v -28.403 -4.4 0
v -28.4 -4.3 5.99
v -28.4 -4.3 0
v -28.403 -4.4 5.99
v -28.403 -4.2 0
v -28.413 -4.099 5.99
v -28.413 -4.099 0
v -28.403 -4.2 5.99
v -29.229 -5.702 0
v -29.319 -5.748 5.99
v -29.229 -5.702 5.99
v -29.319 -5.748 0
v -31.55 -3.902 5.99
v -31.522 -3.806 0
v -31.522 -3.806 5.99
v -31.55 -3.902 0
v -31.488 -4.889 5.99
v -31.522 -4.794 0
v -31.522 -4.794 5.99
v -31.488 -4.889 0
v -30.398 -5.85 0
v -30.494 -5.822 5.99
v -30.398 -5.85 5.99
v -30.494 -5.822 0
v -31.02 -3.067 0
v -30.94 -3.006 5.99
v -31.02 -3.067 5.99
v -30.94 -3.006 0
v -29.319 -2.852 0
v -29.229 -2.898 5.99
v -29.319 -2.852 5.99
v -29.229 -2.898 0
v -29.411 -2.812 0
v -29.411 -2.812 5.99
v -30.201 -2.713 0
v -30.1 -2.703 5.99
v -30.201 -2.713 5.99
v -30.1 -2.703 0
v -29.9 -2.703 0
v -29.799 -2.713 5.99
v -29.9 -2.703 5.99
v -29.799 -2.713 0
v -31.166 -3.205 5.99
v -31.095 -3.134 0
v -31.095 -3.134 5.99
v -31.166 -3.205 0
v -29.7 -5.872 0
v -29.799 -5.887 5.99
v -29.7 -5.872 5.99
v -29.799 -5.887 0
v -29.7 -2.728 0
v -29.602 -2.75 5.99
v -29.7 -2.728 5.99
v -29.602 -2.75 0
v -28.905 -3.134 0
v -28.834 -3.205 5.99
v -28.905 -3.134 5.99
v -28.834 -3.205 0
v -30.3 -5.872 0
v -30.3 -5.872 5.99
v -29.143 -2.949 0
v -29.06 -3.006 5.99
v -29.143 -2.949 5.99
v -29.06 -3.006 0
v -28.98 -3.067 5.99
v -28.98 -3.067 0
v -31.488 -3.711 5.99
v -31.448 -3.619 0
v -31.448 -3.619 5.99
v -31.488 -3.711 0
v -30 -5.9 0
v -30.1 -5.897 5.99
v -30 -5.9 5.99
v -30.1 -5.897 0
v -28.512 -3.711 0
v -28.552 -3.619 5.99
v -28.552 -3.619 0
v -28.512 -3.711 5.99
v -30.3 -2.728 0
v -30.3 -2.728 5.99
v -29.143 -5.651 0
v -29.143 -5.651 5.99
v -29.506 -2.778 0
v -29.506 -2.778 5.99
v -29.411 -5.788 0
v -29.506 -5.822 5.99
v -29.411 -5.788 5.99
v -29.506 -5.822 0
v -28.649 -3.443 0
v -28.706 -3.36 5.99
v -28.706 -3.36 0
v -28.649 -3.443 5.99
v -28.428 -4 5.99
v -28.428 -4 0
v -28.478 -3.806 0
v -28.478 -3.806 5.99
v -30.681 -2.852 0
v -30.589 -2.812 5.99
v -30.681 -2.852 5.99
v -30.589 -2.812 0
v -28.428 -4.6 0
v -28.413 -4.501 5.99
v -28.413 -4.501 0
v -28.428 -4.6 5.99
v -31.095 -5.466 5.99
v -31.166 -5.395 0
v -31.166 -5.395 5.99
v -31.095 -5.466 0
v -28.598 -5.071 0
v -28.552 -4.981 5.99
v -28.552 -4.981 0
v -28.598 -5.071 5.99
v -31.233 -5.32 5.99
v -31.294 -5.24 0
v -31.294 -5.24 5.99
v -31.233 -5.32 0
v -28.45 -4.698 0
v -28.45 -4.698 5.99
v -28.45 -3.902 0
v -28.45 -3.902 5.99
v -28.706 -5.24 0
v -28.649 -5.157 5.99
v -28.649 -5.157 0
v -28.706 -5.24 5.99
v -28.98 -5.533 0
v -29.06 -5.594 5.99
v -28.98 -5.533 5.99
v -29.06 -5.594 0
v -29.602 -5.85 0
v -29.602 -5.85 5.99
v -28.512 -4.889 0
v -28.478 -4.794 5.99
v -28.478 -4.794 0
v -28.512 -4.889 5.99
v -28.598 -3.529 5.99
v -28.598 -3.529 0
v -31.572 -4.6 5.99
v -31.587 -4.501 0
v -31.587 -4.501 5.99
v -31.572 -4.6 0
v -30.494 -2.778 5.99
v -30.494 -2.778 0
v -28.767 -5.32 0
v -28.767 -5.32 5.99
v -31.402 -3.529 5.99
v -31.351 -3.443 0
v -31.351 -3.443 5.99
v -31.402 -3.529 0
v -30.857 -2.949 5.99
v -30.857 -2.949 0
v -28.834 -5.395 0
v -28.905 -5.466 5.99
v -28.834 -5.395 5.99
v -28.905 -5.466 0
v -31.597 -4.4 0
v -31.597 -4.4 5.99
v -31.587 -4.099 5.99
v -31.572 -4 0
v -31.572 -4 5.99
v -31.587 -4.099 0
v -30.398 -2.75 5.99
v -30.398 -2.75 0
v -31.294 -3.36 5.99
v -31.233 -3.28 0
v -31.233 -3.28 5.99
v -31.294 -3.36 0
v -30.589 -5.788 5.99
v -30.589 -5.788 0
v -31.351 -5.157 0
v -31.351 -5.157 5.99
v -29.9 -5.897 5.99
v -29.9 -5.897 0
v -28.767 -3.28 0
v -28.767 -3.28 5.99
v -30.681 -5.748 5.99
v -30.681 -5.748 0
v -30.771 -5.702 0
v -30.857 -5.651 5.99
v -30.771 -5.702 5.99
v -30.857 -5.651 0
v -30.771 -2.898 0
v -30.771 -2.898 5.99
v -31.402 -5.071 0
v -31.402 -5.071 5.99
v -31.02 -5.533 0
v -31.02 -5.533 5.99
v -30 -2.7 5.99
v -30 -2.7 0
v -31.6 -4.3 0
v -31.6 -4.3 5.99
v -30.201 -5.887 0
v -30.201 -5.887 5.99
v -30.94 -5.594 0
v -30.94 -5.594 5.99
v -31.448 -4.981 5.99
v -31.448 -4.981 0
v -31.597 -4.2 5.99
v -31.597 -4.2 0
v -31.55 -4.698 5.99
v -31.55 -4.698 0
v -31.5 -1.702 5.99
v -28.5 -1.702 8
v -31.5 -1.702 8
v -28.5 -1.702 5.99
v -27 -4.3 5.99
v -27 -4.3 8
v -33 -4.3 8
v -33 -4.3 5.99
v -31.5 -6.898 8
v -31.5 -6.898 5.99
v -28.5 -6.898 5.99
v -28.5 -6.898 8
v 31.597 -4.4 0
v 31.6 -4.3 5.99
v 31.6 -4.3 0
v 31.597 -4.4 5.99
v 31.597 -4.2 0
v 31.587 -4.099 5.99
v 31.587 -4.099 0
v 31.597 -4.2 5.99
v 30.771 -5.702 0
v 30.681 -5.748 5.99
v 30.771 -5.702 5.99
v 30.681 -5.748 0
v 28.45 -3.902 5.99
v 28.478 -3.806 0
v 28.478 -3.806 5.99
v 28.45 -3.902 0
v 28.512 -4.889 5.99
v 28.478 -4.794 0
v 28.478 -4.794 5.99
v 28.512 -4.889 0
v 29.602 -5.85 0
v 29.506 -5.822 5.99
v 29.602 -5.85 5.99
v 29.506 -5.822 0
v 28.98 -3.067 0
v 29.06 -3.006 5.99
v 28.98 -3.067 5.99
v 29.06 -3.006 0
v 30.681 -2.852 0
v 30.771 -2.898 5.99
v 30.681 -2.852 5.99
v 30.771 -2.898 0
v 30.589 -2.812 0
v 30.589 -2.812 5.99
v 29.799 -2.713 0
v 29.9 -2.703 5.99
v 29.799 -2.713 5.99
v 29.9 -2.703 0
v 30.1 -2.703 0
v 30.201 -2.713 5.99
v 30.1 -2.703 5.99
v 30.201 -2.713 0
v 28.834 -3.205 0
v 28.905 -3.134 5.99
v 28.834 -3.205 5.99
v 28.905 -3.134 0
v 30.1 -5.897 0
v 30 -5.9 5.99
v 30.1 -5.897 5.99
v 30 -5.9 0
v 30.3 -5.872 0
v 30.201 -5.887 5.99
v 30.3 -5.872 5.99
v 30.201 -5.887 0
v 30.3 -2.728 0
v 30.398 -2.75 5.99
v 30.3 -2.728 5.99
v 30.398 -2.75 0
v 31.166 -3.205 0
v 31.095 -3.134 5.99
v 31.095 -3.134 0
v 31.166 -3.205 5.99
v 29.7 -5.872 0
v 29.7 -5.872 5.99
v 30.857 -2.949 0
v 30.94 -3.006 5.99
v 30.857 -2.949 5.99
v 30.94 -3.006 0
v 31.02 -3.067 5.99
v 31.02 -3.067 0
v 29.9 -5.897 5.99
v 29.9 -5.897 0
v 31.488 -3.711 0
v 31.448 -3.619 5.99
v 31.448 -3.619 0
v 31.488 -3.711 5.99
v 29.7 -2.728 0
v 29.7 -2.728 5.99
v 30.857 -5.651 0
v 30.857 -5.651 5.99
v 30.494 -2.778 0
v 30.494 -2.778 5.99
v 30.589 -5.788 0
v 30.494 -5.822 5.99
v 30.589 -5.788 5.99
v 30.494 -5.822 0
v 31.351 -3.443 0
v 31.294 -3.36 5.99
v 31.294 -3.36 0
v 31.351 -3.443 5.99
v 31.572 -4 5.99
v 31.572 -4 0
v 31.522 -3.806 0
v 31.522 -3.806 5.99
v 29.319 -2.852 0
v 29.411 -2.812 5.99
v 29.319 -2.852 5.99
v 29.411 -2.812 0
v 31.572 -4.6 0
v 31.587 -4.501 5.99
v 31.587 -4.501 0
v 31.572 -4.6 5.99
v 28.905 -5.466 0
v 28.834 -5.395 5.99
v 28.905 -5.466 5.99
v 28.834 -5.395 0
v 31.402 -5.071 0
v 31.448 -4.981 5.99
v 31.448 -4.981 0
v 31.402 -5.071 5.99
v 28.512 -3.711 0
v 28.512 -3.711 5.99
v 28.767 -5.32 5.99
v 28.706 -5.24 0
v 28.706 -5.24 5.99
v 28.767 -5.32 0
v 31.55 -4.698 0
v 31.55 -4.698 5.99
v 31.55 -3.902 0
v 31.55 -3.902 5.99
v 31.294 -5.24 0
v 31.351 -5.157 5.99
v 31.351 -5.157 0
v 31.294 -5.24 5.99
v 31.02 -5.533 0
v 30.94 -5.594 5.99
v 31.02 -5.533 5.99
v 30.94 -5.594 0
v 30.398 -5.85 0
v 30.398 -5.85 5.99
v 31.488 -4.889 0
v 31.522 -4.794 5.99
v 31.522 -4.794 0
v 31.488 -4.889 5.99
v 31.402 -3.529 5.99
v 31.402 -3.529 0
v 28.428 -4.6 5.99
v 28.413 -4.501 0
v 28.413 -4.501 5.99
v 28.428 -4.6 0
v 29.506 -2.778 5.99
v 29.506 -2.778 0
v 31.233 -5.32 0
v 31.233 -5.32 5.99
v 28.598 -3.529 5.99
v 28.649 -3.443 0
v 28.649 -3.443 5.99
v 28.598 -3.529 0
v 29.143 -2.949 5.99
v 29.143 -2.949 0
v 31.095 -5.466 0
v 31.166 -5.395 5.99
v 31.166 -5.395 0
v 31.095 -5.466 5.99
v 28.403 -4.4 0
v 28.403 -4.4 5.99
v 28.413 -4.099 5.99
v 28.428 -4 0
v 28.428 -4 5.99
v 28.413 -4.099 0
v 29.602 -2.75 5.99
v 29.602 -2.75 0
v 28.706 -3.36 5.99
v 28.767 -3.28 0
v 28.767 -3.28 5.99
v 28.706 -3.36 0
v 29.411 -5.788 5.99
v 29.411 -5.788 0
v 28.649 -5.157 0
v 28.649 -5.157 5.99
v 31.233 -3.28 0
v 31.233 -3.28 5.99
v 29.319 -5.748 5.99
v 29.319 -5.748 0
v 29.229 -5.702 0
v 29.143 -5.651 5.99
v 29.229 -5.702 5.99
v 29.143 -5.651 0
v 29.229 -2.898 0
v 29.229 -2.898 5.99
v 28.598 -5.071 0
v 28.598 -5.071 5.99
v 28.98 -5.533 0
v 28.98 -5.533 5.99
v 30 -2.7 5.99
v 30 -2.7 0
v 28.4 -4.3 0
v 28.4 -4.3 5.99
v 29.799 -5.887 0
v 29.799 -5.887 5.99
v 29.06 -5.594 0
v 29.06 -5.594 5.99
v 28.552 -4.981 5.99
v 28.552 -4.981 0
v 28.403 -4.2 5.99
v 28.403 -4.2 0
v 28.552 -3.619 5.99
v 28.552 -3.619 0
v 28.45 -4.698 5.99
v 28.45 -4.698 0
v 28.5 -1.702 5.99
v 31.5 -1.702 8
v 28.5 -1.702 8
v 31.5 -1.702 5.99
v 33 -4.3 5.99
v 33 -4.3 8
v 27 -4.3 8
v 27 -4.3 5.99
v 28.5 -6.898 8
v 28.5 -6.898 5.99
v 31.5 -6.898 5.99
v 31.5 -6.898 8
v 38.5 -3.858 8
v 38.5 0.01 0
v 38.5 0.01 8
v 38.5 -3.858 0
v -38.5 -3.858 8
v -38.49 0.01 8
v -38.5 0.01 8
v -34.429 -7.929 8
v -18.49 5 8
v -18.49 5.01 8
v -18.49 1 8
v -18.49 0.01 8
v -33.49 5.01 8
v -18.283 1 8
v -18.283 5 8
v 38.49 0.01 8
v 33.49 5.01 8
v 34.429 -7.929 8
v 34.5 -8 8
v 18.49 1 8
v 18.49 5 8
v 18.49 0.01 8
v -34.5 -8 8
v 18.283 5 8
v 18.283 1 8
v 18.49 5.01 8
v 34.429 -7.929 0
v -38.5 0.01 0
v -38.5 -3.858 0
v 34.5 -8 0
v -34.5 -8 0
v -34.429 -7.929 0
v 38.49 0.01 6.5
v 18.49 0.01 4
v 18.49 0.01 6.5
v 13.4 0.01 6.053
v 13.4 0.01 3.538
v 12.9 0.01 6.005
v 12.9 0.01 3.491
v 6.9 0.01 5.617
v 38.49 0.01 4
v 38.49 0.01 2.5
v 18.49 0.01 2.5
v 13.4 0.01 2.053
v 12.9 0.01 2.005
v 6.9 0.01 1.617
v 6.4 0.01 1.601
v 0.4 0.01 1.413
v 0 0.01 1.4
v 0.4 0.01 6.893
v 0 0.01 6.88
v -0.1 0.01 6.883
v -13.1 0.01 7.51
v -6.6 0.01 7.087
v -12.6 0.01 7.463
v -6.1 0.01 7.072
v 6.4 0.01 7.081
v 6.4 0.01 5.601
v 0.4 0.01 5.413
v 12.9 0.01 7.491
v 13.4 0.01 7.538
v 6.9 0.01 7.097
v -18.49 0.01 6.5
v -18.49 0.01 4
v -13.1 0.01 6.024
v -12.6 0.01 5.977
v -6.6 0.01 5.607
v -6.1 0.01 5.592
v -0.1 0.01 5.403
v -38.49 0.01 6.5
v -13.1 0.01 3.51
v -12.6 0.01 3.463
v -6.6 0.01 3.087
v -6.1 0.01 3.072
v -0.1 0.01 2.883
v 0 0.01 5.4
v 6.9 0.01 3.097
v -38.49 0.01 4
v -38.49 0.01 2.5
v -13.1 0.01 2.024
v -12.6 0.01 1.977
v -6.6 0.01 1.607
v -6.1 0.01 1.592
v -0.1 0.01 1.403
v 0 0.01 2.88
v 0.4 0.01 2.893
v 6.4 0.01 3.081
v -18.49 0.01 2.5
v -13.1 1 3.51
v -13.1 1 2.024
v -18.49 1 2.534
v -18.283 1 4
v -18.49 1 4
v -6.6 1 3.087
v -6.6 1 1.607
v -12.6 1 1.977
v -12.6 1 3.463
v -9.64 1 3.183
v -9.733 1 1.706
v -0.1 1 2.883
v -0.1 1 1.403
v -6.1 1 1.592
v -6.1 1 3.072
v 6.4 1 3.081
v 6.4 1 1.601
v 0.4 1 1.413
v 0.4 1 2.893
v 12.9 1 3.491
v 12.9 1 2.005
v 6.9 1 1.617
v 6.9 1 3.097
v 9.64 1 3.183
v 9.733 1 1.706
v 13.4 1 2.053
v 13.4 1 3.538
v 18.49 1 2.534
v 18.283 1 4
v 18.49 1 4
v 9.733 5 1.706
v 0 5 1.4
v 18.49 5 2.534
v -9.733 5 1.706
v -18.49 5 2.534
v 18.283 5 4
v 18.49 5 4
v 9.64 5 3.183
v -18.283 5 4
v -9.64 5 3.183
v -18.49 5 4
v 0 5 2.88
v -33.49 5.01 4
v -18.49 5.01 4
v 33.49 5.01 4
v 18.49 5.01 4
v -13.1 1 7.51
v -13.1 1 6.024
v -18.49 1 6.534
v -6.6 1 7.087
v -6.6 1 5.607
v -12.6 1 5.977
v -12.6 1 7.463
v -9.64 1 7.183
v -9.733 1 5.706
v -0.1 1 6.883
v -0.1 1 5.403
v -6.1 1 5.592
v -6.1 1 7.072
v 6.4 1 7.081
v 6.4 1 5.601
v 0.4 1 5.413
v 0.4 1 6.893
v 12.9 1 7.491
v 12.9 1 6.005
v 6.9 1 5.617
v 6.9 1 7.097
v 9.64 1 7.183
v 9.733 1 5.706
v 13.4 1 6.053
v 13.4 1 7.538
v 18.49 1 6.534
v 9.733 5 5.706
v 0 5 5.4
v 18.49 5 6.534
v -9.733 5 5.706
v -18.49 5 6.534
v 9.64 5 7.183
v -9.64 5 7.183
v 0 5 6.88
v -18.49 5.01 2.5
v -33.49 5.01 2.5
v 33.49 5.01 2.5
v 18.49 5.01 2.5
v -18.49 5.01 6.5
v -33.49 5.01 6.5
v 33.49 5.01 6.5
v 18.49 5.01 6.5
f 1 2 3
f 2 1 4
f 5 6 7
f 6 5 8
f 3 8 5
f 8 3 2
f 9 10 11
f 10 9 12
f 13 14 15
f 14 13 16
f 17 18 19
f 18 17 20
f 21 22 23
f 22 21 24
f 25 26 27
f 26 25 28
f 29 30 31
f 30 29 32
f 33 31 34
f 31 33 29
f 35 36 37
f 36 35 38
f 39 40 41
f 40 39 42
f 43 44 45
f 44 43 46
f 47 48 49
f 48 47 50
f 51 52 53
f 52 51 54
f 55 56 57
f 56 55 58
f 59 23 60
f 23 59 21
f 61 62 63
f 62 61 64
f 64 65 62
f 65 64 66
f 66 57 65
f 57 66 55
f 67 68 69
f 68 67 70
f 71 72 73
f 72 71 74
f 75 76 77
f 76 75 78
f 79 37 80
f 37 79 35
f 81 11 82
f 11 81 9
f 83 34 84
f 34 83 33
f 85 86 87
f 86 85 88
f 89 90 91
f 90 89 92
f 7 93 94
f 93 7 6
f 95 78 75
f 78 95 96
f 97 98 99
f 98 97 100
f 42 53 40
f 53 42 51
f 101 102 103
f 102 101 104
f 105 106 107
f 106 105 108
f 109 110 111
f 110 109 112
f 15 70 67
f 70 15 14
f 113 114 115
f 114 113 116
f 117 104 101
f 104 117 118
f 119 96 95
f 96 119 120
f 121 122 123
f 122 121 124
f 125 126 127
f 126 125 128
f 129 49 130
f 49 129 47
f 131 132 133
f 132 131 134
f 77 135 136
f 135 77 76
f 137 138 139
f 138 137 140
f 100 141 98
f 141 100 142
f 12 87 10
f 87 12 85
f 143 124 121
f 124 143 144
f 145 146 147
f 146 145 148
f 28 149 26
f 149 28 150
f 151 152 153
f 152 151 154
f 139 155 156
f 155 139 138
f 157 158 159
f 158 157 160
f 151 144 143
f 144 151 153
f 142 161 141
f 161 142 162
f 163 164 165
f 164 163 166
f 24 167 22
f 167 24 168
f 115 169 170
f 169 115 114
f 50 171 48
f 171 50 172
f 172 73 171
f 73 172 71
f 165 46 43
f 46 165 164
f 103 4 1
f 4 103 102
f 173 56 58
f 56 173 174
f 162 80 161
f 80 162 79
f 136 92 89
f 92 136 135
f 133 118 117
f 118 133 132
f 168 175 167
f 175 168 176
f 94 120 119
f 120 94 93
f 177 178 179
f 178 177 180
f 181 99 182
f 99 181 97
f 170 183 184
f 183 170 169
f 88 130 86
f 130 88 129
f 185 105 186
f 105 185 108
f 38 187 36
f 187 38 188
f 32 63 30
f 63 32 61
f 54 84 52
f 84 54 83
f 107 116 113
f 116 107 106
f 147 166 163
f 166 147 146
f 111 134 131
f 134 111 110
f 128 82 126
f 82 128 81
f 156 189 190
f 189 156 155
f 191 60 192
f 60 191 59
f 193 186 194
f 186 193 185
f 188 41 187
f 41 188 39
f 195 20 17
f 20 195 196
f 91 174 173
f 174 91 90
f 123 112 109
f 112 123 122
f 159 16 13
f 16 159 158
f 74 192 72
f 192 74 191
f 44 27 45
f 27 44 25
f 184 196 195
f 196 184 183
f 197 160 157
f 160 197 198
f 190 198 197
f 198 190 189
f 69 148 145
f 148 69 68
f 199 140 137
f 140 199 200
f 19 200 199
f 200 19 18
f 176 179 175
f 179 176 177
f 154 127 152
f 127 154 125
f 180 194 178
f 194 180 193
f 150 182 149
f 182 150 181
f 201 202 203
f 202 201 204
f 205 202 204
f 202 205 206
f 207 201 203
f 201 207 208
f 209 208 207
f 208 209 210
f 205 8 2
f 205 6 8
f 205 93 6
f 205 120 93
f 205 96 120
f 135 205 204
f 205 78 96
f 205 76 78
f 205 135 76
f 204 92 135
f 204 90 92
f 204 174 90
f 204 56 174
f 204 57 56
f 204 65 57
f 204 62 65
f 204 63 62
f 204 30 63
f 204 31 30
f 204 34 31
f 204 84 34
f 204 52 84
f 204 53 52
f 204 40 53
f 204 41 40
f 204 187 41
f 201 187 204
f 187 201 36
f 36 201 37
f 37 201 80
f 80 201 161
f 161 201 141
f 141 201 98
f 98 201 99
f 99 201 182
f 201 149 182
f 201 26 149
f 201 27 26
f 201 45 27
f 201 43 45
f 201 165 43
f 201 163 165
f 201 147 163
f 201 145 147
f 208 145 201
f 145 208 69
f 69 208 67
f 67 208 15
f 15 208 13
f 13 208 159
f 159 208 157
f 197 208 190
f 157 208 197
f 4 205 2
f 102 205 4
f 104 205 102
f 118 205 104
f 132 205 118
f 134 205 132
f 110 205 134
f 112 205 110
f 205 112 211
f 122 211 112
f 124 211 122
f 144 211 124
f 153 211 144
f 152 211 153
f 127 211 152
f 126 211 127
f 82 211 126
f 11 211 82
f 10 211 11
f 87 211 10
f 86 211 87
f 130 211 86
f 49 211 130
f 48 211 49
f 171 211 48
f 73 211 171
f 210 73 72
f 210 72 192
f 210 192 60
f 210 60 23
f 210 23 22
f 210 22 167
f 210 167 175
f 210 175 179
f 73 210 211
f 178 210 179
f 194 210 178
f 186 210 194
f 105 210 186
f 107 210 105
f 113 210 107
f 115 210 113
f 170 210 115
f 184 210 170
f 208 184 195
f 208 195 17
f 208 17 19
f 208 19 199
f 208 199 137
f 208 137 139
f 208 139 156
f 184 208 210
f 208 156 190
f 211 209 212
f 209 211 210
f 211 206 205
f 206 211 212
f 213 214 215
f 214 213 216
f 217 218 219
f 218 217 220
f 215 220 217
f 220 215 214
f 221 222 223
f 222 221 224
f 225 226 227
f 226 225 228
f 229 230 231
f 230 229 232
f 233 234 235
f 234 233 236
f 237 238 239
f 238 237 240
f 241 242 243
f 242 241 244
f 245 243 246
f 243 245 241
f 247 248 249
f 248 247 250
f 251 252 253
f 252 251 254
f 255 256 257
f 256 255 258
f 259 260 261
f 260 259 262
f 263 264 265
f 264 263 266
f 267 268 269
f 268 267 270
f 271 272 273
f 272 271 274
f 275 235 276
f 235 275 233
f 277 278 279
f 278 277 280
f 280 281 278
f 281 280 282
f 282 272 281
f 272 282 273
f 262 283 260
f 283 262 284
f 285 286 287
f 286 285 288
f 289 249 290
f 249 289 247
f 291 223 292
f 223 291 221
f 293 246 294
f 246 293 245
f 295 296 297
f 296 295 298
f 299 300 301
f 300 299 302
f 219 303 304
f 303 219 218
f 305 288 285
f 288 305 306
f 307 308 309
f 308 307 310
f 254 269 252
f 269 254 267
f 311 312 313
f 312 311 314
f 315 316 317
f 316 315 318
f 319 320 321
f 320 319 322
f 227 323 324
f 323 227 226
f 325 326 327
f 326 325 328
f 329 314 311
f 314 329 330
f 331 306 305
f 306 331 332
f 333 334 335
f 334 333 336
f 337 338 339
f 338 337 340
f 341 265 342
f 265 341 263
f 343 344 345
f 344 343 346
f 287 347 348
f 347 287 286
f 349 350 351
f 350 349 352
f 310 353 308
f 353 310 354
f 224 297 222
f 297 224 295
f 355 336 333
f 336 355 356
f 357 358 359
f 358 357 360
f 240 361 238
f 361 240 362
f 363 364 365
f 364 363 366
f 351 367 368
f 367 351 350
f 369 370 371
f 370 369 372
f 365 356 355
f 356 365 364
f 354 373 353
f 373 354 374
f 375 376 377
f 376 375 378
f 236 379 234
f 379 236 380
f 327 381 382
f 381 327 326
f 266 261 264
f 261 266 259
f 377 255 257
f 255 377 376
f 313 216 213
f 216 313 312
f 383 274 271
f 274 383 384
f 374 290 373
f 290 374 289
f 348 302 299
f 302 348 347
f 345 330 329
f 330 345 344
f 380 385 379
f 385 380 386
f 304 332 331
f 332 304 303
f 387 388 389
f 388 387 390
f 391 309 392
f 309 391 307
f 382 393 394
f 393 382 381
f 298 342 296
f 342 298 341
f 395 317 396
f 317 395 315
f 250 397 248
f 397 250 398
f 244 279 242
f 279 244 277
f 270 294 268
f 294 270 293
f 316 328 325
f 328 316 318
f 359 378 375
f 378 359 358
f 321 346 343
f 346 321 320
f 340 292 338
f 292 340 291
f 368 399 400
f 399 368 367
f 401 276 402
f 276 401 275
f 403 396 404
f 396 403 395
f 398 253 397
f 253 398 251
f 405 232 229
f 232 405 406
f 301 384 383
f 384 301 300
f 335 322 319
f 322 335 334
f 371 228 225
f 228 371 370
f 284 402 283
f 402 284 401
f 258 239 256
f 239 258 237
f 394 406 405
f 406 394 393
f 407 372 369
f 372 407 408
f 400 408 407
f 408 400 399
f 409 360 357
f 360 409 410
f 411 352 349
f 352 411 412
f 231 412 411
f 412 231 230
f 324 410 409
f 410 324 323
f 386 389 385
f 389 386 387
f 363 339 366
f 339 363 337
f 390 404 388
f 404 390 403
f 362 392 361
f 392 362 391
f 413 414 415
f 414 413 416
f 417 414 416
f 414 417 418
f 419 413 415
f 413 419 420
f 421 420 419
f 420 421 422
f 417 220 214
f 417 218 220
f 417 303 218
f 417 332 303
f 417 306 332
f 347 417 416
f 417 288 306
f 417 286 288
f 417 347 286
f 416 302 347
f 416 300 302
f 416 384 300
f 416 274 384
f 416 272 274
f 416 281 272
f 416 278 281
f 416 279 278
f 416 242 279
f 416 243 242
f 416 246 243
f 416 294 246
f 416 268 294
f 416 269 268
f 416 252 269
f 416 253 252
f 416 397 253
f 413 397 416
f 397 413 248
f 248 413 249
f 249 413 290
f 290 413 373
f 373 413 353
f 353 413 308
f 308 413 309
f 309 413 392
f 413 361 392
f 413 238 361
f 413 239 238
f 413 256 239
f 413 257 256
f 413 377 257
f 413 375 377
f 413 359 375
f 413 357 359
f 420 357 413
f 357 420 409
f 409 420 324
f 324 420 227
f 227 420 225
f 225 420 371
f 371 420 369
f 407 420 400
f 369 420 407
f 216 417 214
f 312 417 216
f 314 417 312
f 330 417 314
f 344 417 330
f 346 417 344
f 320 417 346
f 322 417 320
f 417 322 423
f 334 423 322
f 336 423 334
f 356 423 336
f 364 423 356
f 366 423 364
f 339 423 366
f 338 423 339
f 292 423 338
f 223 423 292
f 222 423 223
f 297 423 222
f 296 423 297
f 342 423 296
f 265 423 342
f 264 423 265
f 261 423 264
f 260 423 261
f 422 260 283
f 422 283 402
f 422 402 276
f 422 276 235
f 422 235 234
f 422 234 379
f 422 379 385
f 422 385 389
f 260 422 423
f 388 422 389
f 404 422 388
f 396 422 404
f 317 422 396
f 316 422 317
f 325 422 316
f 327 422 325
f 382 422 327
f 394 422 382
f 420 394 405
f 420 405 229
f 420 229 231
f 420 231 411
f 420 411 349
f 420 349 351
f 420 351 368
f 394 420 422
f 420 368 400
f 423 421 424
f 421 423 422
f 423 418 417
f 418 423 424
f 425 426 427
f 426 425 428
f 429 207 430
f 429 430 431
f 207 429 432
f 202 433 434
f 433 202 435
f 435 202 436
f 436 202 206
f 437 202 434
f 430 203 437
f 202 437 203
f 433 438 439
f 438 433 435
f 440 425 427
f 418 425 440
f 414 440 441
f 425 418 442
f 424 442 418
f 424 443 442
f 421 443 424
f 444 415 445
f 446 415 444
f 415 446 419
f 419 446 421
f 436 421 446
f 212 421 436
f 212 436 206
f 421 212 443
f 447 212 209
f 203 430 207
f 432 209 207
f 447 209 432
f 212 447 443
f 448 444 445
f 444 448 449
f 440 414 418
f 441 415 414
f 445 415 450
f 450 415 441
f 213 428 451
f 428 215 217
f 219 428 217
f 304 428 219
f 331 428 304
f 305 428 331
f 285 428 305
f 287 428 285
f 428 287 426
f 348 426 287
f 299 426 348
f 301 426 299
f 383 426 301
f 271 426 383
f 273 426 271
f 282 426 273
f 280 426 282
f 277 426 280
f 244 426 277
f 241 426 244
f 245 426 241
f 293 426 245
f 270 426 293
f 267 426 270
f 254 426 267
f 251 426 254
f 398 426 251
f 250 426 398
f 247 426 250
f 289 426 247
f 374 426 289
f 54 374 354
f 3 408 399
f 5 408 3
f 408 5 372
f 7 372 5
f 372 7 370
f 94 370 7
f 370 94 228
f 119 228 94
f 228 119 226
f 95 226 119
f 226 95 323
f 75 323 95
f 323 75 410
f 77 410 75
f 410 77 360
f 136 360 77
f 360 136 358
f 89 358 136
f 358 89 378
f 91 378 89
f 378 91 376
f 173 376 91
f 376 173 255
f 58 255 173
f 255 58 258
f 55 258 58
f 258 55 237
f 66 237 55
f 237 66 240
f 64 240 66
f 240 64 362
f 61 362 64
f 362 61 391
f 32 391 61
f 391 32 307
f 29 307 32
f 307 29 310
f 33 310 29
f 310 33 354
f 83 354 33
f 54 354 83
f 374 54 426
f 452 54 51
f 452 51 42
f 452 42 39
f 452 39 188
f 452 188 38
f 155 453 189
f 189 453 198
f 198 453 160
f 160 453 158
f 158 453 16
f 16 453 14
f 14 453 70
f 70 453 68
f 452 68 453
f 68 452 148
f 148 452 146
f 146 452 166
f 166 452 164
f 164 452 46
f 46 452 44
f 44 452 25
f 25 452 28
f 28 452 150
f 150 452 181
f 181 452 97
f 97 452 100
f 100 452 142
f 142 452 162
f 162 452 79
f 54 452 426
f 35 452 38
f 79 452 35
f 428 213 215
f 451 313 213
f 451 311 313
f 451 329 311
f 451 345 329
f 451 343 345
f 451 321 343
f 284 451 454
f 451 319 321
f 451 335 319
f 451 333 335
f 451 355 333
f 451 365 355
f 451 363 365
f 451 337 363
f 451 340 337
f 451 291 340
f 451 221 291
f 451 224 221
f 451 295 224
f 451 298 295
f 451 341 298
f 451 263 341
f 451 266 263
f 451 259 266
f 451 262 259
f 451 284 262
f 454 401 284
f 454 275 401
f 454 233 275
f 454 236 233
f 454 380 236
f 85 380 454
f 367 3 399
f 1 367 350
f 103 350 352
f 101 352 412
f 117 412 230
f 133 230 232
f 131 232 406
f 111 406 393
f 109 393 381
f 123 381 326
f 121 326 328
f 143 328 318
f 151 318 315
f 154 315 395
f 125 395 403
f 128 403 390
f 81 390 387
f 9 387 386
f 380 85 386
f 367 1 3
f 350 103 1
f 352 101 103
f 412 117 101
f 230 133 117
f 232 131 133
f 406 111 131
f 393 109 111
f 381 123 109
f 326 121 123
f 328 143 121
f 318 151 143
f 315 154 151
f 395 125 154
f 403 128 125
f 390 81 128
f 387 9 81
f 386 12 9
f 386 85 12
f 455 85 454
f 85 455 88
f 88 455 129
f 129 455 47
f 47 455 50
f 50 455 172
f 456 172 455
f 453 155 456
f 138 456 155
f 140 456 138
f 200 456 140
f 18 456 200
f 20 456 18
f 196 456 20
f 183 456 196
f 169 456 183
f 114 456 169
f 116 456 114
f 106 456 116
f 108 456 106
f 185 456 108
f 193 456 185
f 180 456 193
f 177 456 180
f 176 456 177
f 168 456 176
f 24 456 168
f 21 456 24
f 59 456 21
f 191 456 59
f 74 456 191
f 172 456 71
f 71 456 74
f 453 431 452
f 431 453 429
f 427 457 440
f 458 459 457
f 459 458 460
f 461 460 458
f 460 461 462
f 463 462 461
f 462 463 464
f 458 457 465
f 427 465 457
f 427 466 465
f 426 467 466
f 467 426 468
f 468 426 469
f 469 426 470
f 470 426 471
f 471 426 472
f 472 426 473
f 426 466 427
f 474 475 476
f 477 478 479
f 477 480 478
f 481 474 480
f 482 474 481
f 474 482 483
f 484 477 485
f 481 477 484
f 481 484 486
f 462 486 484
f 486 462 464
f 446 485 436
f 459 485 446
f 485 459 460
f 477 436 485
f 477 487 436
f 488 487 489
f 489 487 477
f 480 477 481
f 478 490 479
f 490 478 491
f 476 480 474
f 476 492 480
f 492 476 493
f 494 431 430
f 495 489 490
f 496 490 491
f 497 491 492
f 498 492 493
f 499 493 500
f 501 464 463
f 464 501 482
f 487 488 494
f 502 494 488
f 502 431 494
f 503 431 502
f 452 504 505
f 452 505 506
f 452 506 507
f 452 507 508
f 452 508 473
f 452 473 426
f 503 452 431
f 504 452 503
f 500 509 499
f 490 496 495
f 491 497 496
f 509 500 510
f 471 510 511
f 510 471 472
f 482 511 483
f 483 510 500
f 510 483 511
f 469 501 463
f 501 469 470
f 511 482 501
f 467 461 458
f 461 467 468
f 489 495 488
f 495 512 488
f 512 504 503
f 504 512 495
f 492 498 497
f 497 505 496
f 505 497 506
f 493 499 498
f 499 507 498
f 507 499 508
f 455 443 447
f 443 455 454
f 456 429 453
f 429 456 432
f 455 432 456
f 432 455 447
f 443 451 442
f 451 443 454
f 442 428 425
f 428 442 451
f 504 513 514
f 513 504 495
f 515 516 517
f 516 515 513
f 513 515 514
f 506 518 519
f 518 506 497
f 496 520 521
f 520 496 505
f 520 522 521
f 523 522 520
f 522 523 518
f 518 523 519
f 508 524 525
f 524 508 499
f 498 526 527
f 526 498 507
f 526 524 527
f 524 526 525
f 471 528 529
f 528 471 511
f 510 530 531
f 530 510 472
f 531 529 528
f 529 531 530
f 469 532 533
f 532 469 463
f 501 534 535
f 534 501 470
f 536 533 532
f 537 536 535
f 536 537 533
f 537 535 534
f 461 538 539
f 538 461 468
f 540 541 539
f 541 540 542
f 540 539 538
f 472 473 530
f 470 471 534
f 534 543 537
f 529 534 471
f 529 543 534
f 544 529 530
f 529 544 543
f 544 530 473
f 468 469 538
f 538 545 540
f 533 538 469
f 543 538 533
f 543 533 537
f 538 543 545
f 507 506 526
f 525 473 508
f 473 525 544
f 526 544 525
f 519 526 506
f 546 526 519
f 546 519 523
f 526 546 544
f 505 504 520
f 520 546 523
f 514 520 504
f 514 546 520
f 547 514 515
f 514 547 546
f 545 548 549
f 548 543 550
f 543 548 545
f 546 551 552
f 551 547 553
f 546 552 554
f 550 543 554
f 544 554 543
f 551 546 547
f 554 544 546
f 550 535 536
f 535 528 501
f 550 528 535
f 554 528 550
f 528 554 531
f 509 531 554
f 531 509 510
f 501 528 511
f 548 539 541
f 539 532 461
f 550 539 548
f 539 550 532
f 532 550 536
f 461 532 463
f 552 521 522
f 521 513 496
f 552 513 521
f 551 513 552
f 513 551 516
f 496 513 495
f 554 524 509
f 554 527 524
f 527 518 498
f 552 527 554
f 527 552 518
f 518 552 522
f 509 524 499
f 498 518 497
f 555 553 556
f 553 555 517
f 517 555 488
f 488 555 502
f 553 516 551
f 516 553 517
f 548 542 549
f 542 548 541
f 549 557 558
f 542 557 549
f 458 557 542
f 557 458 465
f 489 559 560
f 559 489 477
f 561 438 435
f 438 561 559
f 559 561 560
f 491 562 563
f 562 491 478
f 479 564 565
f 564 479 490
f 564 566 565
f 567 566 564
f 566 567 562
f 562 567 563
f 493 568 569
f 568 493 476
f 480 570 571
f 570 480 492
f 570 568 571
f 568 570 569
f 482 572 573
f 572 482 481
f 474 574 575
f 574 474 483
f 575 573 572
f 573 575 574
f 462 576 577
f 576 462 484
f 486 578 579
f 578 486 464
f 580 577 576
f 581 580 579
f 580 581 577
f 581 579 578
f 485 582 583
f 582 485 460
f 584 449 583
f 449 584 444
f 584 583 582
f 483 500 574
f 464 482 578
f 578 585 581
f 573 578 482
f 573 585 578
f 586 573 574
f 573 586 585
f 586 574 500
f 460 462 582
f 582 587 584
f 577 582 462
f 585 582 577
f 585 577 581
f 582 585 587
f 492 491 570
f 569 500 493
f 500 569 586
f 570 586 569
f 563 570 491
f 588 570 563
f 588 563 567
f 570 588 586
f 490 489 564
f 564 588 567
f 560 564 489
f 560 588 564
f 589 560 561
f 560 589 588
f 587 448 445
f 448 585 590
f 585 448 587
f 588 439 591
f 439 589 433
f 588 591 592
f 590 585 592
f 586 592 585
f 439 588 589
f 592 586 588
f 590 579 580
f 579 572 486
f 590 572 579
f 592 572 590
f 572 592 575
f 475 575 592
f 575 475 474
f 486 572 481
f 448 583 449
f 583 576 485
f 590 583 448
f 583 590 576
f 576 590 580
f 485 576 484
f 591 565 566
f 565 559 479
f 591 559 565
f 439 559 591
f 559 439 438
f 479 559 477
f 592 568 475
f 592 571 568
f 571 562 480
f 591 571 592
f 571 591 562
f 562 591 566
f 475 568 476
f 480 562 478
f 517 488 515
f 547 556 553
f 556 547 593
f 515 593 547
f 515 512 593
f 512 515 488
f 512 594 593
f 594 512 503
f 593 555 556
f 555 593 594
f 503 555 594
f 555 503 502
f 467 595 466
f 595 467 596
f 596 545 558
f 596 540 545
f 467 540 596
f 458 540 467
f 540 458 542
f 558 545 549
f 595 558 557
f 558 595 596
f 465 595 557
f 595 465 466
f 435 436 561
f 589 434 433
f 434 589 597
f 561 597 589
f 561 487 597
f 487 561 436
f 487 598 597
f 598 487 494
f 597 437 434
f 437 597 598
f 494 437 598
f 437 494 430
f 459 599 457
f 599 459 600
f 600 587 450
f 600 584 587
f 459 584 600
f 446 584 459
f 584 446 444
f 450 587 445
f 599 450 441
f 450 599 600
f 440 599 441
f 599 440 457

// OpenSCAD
//
// Filter Slot for Formatt Hitech 67mm Filter (double height)
// Copyright (C) 2021 Uwe Glässner
//

// slot lengths (mm)
l = 77; // total length
l1 = 20;  // length until curve 
// slot widths (mm)
w1 = 8;
w2 = 1.0;
w3 = 4.0;
w  = w1+w2+w3;
// slot height (mm)
h1 = 1.5; // curvature thickness
cr = 155; // curvature radius
of = 1.4; // curvature offset for 2mm firecrest filters (instead of 1.4mm Resin) 
h = 4; // total height

D = 0.01; // generic overlap of parts.

module loch(posx,posy){
    union(){
       translate([posx, posy,-D]) cylinder(d=3.2, h=2*h+2*D, $fn=100);
       translate([posx, posy,-D+2*h-2.0]) cylinder(d=6.0, h=2.0+2*D, $fn=6);
    }
}


// thick side of holder with holes and removed corners
difference(){
   translate([-l/2,-w1,0]) cube([l,w1+D,2*h]);
   loch(-l/2+8.5, -8+3.7); 
   loch( l/2-8.5, -8+3.7); 
   // reomve corners:
   translate([-l/2-3,-15,-D]) rotate([0,0,45]) cube([10,10,2*h+2*D]);
   translate([l/2+3,-15,-D]) rotate([0,0,45]) cube([10,10,2*h+2*D]);
   }

// Arc on thin side
intersection(){
    translate([-l/2,0,0]) cube([l,w2+w3,h]);
    difference(){
       translate([0,w3+w2,cr+of]) rotate ([90,90,0]) cylinder(r=cr,h=w3+w2, $fn=100);
       translate([0,w3+w2+D,cr+of]) rotate ([90,90,0]) cylinder(r=cr-h1+2*D,h=w3+w2+2*D, $fn=100);
       // leave some pillars under the arc to assist printing, which must be cut afterwards
       for (i=[0:5]) translate([-l/2+l1+i*6.5-0.6,0,-D+of/2]) cube([6.0,w2,h]);
    }
}  

// 2nd Arc on top on thin side
translate([0,0,h]) intersection(){
    translate([-l/2,0,0]) cube([l,w2+w3,h]);
    difference(){
       translate([0,w3+w2,cr+of]) rotate ([90,90,0]) cylinder(r=cr,h=w3+w2, $fn=100);
       translate([0,w3+w2+D,cr+of]) rotate ([90,90,0]) cylinder(r=cr-h1+2*D,h=w3+w2+2*D, $fn=100);
       // leave some pillars under the arc to assist printing, which must be cut afterwards
       for (i=[0:5]) translate([-l/2+l1+i*6.5-0.6,0,-D+of/2]) cube([6.0,w2,h]);
    }
}
        
// Add thin sides with removed corners
difference(){
   translate([-l/2-D,0,h-h1]) cube([l1+2*D,w2+w3+D,h1]);
   translate([-l/2-1,-1,-D]) rotate([0,0,45]) cube([10,10,h+2*D]);   
}
difference(){
   translate([ l/2-l1-D,0,h-h1]) cube([l1+2*D,w2+w3+D,h1]);
   translate([l/2+1,-1,-D]) rotate([0,0,45]) cube([10,10,h+2*D]);
}
difference(){
   translate([-l/2-D,0,2*h-h1]) cube([l1+2*D,w2+w3+D,h1]);
   translate([-l/2-1,-1,h-D]) rotate([0,0,45]) cube([10,10,h+2*D]);   
}
difference(){
   translate([ l/2-l1-D,0,2*h-h1]) cube([l1+2*D,w2+w3+D,h1]);
   translate([l/2+1,-1,h-D]) rotate([0,0,45]) cube([10,10,h+2*D]);
}
